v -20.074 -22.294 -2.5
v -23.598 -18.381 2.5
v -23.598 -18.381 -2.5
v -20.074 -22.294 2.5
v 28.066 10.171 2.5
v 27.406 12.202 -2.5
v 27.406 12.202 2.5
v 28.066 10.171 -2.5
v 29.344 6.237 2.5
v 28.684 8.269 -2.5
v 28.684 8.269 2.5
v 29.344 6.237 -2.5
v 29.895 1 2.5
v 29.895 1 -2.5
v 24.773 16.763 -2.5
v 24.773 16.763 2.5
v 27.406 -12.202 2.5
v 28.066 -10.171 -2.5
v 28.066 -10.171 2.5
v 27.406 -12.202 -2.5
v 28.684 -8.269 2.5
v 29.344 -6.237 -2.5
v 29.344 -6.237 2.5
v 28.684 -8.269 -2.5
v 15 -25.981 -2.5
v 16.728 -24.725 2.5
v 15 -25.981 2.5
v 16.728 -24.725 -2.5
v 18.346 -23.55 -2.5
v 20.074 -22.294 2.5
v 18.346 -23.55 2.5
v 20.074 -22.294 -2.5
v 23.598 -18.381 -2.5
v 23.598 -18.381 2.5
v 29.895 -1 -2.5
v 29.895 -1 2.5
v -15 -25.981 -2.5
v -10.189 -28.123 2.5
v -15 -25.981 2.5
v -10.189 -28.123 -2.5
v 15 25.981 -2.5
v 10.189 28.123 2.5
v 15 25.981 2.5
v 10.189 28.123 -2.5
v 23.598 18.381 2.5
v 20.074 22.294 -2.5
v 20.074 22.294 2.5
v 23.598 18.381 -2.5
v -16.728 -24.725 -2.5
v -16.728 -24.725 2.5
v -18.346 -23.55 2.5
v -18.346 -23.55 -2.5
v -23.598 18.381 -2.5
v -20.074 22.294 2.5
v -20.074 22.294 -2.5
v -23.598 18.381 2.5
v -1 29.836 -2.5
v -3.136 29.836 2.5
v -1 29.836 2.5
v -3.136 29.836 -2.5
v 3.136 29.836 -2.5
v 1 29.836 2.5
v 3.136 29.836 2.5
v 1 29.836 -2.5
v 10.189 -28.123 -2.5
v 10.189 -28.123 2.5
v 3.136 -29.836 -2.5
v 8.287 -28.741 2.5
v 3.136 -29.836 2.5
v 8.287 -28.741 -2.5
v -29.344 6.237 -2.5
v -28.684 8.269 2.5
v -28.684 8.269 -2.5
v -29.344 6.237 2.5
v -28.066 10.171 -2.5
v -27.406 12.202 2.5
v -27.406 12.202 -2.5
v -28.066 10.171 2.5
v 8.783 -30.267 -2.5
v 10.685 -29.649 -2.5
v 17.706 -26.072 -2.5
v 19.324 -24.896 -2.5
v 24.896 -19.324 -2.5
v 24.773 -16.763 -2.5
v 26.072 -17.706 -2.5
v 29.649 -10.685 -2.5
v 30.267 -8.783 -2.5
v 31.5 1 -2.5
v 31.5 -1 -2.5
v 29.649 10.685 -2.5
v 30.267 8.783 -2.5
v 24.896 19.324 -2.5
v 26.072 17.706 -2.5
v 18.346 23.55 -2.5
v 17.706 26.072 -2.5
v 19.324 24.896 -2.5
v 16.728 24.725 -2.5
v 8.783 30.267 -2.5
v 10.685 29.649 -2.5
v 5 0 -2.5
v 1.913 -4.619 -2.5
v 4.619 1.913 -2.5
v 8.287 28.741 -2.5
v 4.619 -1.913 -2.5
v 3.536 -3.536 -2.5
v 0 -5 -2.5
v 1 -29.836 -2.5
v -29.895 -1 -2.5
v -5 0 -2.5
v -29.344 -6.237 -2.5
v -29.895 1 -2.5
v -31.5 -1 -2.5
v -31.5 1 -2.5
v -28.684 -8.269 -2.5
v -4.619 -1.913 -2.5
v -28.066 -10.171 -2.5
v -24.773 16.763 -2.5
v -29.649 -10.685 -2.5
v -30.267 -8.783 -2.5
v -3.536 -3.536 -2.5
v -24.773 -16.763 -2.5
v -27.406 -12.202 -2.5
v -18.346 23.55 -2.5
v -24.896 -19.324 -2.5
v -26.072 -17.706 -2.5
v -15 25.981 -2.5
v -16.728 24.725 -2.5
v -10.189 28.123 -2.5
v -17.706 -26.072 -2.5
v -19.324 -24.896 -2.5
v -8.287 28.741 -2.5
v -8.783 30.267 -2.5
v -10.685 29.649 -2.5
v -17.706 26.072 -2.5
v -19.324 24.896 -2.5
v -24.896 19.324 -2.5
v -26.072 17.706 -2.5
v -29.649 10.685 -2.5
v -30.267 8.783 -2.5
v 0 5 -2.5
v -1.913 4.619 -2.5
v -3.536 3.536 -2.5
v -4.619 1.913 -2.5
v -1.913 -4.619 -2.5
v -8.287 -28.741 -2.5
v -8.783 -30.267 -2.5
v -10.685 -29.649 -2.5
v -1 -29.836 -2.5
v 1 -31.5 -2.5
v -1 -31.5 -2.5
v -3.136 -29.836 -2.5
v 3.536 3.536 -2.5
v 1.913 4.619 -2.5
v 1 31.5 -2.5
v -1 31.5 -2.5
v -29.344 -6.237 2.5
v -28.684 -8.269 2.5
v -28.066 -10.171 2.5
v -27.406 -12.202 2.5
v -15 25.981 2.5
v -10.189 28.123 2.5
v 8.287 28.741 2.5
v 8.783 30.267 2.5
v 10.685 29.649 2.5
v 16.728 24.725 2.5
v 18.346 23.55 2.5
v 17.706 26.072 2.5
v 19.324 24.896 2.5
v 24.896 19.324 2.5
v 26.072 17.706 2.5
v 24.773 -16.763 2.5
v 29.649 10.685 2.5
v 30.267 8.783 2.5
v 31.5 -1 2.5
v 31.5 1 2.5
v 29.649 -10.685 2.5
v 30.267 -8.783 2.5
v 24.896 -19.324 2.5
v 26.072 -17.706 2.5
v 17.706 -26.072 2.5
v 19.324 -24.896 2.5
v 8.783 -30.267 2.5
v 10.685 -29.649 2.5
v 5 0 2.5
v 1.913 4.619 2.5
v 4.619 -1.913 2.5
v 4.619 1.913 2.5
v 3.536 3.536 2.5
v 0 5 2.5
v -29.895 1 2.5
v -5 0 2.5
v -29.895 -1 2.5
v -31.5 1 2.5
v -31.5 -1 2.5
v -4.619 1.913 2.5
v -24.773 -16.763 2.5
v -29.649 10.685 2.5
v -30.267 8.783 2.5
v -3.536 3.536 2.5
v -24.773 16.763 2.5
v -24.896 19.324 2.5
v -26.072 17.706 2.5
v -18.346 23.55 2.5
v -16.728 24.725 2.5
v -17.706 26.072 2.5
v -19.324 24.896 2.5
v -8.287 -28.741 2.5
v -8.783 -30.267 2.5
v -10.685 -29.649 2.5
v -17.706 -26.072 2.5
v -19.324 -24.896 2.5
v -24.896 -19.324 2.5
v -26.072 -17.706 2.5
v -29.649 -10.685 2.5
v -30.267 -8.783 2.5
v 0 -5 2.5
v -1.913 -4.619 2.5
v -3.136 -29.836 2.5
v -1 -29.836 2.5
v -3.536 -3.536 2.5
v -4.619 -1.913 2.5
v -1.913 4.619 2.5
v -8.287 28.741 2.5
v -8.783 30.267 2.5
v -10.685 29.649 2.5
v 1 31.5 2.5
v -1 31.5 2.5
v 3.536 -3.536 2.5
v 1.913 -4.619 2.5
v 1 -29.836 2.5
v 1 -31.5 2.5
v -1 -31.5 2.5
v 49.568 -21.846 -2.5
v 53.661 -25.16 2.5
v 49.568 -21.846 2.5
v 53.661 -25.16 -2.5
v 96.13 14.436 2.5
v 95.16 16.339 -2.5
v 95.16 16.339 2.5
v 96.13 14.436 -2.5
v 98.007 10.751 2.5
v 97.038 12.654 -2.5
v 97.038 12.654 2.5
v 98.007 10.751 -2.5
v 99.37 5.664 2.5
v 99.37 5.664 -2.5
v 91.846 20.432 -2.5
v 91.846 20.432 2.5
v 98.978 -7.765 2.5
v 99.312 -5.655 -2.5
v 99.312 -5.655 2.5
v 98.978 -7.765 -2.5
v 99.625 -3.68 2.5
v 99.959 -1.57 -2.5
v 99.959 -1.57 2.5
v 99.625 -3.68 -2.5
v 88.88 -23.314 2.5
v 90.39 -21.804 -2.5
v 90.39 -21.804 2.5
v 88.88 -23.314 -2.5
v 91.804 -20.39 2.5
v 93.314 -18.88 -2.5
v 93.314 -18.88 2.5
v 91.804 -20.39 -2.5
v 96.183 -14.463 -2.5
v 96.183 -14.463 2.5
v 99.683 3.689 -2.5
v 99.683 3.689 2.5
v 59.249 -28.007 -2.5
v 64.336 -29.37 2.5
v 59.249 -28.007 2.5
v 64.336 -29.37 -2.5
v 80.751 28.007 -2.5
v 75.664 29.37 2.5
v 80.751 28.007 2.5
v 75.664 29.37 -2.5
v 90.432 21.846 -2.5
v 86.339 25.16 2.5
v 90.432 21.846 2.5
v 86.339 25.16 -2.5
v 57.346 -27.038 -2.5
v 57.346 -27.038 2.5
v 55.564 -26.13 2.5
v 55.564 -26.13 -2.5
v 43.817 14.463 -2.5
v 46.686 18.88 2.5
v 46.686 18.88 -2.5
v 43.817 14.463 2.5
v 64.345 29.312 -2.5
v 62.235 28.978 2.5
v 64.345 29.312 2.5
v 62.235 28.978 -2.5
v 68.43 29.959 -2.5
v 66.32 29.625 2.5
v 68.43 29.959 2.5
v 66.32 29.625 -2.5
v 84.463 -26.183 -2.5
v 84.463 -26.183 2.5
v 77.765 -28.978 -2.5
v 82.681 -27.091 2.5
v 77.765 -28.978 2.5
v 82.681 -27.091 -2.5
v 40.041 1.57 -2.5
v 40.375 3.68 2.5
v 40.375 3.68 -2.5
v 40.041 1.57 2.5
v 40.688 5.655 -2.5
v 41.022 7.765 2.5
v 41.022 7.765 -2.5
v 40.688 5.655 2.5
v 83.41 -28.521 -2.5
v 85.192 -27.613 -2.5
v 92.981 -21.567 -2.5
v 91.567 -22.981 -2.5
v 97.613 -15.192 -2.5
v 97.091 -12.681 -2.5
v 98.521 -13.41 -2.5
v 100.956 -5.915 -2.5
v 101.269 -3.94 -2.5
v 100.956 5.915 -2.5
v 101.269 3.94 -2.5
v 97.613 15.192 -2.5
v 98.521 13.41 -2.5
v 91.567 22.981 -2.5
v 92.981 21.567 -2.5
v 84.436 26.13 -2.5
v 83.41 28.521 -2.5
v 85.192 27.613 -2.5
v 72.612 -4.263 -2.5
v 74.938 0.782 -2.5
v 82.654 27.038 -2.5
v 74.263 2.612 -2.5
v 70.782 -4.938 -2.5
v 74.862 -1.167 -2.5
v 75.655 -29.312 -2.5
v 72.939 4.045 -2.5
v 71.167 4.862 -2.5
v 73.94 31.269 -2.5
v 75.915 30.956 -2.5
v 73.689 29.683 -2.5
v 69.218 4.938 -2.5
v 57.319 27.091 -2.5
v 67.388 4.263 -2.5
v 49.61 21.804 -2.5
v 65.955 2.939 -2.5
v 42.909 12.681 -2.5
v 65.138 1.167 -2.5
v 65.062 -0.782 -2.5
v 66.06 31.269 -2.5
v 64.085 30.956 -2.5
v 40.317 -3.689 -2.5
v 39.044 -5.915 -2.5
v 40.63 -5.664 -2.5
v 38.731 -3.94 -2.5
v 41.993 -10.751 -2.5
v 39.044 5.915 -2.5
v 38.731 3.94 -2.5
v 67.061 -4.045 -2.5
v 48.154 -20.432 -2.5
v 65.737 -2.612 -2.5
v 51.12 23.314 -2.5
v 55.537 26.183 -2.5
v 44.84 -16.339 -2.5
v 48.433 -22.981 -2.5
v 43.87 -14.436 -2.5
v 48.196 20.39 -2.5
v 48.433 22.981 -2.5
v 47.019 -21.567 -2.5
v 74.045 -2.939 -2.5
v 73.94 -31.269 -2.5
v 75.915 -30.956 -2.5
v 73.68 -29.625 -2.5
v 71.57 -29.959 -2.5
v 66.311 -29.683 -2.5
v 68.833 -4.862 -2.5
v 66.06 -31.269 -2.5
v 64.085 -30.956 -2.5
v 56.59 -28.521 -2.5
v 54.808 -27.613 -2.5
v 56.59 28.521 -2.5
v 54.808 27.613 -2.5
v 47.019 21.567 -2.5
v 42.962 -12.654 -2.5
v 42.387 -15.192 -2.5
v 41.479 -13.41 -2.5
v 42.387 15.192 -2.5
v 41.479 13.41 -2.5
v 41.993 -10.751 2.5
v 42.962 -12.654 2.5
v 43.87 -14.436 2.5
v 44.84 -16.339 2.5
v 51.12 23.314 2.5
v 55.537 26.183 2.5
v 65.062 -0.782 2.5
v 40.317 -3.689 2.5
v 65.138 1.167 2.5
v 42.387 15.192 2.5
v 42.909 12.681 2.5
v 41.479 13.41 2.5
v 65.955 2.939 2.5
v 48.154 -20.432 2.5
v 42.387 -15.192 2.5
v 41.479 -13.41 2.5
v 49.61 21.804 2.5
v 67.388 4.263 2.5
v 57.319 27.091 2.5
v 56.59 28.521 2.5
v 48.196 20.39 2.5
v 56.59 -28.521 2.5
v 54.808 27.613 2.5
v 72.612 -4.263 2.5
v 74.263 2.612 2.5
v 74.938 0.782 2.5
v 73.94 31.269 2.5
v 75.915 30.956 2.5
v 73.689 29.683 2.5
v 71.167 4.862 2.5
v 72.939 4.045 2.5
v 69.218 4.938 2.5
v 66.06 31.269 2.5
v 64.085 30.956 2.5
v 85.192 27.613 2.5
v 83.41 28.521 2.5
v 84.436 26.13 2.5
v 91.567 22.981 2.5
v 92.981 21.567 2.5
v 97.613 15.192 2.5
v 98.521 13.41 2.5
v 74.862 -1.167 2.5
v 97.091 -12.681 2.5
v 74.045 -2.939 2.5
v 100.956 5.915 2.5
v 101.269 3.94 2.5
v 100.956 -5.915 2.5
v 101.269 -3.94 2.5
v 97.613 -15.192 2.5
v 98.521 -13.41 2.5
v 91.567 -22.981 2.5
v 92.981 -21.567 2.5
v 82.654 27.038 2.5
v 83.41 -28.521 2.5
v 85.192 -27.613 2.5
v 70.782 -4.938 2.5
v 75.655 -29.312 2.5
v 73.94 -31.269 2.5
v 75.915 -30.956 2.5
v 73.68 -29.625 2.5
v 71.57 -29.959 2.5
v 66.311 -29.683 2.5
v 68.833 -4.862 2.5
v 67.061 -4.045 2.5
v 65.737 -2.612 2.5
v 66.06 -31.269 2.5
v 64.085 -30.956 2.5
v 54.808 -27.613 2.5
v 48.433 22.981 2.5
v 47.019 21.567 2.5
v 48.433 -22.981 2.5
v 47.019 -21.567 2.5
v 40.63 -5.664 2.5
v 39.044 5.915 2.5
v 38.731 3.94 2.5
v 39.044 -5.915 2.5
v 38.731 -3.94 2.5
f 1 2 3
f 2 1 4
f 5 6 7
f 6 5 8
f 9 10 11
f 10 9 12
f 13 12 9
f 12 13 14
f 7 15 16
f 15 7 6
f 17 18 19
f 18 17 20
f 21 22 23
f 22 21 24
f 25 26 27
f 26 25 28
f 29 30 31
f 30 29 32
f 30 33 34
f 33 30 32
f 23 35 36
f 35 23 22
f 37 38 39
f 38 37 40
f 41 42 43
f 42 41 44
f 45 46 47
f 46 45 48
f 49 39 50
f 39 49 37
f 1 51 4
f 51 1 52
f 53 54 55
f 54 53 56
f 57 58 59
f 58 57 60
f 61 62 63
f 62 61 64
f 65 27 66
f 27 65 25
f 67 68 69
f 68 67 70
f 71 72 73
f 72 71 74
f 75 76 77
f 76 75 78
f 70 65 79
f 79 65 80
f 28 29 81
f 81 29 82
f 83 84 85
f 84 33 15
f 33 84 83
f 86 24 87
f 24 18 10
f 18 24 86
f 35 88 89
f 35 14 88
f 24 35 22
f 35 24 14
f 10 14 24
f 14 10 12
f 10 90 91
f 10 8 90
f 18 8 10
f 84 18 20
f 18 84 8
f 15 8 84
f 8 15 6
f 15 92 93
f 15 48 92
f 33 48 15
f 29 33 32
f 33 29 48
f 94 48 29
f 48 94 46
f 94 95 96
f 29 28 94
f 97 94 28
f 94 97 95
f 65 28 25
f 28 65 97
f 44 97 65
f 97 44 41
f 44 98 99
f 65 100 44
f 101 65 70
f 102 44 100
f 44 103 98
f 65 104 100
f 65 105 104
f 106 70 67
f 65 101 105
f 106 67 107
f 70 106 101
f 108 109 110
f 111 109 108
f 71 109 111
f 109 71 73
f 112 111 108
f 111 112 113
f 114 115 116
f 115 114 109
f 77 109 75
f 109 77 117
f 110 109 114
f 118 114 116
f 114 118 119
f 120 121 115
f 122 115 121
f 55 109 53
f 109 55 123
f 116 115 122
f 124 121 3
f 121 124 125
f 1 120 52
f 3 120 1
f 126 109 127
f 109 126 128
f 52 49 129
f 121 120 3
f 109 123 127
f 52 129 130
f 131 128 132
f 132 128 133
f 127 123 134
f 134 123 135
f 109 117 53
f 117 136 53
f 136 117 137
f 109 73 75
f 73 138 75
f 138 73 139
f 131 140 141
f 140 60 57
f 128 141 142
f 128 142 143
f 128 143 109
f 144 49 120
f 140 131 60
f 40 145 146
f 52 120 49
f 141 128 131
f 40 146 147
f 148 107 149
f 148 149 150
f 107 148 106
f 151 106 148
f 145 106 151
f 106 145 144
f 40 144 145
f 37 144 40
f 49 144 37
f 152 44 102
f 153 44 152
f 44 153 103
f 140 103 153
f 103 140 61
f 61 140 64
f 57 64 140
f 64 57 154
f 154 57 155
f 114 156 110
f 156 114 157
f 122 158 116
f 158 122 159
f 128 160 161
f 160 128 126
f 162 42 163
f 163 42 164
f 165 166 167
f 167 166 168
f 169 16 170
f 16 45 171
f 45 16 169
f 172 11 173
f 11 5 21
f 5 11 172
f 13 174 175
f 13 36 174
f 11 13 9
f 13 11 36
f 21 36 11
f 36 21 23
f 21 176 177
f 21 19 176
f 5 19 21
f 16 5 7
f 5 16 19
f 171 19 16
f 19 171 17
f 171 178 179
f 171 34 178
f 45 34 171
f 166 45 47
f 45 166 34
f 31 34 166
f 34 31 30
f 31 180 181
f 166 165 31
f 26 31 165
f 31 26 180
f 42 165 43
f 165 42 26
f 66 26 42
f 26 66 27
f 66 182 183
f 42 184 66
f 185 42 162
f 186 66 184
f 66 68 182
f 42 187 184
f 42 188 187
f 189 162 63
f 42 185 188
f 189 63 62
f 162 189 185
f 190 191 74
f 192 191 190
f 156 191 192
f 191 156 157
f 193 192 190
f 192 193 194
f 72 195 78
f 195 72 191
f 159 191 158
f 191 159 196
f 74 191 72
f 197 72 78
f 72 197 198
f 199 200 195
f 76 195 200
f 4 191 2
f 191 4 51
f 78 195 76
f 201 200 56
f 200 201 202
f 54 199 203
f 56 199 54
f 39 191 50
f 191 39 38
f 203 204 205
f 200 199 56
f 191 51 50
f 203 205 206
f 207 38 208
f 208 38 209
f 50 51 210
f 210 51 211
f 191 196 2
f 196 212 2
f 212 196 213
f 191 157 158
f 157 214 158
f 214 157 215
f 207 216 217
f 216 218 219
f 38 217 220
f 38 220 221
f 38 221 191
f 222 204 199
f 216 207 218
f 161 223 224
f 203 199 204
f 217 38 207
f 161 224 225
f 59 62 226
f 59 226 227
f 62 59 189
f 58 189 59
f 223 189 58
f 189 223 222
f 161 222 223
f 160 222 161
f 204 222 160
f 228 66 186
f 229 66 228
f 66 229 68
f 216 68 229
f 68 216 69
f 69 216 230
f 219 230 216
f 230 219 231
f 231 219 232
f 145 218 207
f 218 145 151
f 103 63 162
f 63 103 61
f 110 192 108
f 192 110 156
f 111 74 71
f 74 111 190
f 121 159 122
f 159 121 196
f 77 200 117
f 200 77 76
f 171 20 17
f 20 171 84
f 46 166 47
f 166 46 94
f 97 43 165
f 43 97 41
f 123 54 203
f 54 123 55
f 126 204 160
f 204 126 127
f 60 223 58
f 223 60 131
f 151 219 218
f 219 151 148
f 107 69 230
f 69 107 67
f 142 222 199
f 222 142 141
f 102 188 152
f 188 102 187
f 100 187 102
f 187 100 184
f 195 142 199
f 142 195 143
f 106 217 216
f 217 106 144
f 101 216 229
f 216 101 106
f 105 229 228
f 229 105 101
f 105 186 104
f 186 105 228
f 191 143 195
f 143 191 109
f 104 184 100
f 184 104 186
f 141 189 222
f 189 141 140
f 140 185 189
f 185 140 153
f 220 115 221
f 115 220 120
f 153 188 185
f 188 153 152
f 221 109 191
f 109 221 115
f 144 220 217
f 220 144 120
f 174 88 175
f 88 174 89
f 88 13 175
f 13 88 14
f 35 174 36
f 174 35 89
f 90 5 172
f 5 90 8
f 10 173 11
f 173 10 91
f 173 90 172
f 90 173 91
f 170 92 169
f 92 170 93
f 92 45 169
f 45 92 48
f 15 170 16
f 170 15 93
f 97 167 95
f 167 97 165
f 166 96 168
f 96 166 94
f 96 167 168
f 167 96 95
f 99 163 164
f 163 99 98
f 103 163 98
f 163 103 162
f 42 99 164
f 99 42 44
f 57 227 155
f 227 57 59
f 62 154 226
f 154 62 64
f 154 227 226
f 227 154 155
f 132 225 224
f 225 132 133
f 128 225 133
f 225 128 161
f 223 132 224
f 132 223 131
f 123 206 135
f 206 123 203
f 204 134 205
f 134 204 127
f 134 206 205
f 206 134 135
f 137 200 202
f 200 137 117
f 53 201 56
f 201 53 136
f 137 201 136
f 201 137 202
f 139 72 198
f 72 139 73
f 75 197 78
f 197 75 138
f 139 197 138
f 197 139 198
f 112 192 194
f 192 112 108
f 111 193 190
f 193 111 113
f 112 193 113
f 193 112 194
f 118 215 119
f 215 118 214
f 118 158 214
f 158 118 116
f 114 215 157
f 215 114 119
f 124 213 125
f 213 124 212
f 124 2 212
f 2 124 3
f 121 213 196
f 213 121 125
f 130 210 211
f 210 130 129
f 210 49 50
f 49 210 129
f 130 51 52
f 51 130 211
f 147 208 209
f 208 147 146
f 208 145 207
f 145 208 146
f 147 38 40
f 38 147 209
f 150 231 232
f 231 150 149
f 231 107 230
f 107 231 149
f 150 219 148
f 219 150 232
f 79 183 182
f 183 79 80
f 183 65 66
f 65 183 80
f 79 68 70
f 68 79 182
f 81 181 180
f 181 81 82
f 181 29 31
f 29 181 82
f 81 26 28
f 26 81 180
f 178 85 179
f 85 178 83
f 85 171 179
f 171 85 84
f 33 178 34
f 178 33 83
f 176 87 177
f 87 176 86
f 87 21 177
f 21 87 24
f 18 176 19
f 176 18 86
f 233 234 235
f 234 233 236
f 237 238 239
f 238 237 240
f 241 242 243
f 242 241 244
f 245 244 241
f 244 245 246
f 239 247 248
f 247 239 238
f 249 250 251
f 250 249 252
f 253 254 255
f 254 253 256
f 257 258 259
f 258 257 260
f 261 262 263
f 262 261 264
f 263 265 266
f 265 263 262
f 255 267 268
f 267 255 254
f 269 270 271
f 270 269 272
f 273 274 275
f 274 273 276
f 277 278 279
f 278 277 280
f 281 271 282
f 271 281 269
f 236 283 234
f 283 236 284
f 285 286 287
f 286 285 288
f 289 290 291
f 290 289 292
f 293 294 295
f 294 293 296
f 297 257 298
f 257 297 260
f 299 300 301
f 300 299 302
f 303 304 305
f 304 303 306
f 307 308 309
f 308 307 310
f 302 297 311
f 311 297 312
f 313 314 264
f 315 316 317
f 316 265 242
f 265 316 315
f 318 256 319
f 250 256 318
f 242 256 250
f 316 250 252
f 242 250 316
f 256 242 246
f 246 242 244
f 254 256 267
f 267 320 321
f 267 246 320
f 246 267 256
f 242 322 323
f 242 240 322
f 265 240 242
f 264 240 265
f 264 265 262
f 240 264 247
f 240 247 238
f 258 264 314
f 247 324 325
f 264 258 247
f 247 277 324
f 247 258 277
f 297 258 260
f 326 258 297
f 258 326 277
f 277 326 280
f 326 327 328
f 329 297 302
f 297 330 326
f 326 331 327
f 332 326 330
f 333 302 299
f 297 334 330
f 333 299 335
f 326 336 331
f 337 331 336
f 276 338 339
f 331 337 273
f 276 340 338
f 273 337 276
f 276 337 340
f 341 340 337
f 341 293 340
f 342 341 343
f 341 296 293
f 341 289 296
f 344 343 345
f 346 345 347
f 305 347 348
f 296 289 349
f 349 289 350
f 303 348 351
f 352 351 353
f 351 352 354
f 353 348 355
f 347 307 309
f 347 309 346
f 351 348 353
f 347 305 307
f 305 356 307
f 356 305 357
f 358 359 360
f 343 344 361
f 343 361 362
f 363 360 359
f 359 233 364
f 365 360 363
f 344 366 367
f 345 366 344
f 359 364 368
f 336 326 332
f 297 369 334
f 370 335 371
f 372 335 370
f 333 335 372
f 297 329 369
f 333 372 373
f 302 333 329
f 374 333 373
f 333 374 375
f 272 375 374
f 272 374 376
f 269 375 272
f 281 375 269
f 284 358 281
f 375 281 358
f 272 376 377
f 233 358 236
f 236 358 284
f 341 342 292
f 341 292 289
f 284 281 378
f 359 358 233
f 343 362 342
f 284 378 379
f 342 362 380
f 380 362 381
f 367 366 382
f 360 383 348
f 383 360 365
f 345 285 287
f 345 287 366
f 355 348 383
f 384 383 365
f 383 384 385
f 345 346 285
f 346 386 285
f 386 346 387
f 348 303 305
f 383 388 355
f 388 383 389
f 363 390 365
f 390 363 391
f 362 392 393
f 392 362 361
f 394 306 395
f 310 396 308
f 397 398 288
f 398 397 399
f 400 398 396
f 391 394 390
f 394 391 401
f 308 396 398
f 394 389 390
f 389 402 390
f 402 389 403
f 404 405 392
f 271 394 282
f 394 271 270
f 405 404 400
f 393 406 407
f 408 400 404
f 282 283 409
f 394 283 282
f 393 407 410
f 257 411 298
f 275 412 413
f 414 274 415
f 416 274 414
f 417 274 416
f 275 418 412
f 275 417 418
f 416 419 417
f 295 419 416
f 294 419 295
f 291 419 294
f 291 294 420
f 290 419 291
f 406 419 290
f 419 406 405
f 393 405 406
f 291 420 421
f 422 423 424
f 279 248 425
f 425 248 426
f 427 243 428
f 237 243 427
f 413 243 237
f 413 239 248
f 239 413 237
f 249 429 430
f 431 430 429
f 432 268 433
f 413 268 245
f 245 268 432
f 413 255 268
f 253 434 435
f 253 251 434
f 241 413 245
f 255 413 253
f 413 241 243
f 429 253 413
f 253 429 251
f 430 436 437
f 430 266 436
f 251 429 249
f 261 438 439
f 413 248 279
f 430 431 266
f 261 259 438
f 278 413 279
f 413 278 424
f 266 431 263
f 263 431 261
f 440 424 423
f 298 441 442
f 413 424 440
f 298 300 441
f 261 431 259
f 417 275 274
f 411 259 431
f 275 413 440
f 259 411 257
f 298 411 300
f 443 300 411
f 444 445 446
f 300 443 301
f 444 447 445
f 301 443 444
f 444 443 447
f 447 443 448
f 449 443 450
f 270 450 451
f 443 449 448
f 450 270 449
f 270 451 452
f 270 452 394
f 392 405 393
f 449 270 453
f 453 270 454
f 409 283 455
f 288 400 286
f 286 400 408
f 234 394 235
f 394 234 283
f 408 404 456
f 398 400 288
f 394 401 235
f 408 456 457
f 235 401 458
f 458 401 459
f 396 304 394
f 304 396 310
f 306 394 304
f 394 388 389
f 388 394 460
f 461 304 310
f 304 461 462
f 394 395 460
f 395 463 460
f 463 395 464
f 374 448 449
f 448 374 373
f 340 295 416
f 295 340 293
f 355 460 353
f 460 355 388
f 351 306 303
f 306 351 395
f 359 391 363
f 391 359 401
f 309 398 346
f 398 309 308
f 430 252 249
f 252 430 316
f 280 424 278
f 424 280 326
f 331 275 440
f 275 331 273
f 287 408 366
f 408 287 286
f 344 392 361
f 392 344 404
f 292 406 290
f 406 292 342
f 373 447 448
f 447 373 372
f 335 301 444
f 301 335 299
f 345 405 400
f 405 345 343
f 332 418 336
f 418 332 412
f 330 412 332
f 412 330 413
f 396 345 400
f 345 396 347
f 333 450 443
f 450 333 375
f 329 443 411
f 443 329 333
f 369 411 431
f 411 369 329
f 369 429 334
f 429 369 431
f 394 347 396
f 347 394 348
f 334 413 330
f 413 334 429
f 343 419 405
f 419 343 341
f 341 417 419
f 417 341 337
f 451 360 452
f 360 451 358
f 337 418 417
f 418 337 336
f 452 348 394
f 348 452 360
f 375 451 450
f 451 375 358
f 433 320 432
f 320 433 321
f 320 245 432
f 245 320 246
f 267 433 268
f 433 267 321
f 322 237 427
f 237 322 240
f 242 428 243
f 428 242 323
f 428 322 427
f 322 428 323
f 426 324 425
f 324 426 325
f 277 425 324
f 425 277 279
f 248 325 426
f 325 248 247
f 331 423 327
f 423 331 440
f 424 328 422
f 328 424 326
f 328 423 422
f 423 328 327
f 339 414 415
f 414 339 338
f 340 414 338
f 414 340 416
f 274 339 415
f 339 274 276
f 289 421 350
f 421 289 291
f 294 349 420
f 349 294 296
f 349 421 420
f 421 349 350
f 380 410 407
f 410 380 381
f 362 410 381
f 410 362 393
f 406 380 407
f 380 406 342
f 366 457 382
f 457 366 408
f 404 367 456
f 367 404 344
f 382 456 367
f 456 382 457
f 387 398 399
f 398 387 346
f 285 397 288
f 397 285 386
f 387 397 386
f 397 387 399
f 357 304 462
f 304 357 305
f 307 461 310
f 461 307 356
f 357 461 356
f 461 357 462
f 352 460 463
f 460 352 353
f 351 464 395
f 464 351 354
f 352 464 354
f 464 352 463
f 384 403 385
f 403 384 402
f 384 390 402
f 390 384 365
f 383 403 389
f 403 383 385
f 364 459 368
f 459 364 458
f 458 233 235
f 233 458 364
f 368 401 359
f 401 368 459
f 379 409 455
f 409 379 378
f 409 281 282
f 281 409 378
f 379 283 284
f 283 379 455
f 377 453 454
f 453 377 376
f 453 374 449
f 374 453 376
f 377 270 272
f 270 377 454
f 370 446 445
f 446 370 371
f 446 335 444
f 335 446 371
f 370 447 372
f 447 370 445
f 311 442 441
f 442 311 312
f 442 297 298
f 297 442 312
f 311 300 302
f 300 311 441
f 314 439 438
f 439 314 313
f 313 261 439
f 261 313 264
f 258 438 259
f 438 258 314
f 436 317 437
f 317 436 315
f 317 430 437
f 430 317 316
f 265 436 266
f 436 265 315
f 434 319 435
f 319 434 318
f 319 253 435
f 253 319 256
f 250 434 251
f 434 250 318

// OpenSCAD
// OpenSCAD Getting Started Example
// This demonstrates basic AI co-coding concepts for mechanical design

// Parameters - easily adjustable for different designs
gear_teeth = 20;
gear_radius = 30;
gear_height = 5;
tooth_depth = 3;

// Main gear module
module gear() {
    difference() {
        // Main gear body
        cylinder(h=gear_height, r=gear_radius, center=true);
        
        // Center hole
        cylinder(h=gear_height+1, r=5, center=true);
    }
    
    // Add gear teeth
    for (i = [0:gear_teeth-1]) {
        rotate([0, 0, i * 360/gear_teeth]) {
            translate([gear_radius, 0, 0]) {
                cube([tooth_depth, 2, gear_height], center=true);
            }
        }
    }
}

// Create the gear
gear();

// Add a second gear for demonstration
translate([70, 0, 0]) {
    rotate([0, 0, 180/gear_teeth]) {  // Offset for proper meshing
        gear();
    }
}

echo("Generated gear with ", gear_teeth, " teeth and radius ", gear_radius, "mm");
